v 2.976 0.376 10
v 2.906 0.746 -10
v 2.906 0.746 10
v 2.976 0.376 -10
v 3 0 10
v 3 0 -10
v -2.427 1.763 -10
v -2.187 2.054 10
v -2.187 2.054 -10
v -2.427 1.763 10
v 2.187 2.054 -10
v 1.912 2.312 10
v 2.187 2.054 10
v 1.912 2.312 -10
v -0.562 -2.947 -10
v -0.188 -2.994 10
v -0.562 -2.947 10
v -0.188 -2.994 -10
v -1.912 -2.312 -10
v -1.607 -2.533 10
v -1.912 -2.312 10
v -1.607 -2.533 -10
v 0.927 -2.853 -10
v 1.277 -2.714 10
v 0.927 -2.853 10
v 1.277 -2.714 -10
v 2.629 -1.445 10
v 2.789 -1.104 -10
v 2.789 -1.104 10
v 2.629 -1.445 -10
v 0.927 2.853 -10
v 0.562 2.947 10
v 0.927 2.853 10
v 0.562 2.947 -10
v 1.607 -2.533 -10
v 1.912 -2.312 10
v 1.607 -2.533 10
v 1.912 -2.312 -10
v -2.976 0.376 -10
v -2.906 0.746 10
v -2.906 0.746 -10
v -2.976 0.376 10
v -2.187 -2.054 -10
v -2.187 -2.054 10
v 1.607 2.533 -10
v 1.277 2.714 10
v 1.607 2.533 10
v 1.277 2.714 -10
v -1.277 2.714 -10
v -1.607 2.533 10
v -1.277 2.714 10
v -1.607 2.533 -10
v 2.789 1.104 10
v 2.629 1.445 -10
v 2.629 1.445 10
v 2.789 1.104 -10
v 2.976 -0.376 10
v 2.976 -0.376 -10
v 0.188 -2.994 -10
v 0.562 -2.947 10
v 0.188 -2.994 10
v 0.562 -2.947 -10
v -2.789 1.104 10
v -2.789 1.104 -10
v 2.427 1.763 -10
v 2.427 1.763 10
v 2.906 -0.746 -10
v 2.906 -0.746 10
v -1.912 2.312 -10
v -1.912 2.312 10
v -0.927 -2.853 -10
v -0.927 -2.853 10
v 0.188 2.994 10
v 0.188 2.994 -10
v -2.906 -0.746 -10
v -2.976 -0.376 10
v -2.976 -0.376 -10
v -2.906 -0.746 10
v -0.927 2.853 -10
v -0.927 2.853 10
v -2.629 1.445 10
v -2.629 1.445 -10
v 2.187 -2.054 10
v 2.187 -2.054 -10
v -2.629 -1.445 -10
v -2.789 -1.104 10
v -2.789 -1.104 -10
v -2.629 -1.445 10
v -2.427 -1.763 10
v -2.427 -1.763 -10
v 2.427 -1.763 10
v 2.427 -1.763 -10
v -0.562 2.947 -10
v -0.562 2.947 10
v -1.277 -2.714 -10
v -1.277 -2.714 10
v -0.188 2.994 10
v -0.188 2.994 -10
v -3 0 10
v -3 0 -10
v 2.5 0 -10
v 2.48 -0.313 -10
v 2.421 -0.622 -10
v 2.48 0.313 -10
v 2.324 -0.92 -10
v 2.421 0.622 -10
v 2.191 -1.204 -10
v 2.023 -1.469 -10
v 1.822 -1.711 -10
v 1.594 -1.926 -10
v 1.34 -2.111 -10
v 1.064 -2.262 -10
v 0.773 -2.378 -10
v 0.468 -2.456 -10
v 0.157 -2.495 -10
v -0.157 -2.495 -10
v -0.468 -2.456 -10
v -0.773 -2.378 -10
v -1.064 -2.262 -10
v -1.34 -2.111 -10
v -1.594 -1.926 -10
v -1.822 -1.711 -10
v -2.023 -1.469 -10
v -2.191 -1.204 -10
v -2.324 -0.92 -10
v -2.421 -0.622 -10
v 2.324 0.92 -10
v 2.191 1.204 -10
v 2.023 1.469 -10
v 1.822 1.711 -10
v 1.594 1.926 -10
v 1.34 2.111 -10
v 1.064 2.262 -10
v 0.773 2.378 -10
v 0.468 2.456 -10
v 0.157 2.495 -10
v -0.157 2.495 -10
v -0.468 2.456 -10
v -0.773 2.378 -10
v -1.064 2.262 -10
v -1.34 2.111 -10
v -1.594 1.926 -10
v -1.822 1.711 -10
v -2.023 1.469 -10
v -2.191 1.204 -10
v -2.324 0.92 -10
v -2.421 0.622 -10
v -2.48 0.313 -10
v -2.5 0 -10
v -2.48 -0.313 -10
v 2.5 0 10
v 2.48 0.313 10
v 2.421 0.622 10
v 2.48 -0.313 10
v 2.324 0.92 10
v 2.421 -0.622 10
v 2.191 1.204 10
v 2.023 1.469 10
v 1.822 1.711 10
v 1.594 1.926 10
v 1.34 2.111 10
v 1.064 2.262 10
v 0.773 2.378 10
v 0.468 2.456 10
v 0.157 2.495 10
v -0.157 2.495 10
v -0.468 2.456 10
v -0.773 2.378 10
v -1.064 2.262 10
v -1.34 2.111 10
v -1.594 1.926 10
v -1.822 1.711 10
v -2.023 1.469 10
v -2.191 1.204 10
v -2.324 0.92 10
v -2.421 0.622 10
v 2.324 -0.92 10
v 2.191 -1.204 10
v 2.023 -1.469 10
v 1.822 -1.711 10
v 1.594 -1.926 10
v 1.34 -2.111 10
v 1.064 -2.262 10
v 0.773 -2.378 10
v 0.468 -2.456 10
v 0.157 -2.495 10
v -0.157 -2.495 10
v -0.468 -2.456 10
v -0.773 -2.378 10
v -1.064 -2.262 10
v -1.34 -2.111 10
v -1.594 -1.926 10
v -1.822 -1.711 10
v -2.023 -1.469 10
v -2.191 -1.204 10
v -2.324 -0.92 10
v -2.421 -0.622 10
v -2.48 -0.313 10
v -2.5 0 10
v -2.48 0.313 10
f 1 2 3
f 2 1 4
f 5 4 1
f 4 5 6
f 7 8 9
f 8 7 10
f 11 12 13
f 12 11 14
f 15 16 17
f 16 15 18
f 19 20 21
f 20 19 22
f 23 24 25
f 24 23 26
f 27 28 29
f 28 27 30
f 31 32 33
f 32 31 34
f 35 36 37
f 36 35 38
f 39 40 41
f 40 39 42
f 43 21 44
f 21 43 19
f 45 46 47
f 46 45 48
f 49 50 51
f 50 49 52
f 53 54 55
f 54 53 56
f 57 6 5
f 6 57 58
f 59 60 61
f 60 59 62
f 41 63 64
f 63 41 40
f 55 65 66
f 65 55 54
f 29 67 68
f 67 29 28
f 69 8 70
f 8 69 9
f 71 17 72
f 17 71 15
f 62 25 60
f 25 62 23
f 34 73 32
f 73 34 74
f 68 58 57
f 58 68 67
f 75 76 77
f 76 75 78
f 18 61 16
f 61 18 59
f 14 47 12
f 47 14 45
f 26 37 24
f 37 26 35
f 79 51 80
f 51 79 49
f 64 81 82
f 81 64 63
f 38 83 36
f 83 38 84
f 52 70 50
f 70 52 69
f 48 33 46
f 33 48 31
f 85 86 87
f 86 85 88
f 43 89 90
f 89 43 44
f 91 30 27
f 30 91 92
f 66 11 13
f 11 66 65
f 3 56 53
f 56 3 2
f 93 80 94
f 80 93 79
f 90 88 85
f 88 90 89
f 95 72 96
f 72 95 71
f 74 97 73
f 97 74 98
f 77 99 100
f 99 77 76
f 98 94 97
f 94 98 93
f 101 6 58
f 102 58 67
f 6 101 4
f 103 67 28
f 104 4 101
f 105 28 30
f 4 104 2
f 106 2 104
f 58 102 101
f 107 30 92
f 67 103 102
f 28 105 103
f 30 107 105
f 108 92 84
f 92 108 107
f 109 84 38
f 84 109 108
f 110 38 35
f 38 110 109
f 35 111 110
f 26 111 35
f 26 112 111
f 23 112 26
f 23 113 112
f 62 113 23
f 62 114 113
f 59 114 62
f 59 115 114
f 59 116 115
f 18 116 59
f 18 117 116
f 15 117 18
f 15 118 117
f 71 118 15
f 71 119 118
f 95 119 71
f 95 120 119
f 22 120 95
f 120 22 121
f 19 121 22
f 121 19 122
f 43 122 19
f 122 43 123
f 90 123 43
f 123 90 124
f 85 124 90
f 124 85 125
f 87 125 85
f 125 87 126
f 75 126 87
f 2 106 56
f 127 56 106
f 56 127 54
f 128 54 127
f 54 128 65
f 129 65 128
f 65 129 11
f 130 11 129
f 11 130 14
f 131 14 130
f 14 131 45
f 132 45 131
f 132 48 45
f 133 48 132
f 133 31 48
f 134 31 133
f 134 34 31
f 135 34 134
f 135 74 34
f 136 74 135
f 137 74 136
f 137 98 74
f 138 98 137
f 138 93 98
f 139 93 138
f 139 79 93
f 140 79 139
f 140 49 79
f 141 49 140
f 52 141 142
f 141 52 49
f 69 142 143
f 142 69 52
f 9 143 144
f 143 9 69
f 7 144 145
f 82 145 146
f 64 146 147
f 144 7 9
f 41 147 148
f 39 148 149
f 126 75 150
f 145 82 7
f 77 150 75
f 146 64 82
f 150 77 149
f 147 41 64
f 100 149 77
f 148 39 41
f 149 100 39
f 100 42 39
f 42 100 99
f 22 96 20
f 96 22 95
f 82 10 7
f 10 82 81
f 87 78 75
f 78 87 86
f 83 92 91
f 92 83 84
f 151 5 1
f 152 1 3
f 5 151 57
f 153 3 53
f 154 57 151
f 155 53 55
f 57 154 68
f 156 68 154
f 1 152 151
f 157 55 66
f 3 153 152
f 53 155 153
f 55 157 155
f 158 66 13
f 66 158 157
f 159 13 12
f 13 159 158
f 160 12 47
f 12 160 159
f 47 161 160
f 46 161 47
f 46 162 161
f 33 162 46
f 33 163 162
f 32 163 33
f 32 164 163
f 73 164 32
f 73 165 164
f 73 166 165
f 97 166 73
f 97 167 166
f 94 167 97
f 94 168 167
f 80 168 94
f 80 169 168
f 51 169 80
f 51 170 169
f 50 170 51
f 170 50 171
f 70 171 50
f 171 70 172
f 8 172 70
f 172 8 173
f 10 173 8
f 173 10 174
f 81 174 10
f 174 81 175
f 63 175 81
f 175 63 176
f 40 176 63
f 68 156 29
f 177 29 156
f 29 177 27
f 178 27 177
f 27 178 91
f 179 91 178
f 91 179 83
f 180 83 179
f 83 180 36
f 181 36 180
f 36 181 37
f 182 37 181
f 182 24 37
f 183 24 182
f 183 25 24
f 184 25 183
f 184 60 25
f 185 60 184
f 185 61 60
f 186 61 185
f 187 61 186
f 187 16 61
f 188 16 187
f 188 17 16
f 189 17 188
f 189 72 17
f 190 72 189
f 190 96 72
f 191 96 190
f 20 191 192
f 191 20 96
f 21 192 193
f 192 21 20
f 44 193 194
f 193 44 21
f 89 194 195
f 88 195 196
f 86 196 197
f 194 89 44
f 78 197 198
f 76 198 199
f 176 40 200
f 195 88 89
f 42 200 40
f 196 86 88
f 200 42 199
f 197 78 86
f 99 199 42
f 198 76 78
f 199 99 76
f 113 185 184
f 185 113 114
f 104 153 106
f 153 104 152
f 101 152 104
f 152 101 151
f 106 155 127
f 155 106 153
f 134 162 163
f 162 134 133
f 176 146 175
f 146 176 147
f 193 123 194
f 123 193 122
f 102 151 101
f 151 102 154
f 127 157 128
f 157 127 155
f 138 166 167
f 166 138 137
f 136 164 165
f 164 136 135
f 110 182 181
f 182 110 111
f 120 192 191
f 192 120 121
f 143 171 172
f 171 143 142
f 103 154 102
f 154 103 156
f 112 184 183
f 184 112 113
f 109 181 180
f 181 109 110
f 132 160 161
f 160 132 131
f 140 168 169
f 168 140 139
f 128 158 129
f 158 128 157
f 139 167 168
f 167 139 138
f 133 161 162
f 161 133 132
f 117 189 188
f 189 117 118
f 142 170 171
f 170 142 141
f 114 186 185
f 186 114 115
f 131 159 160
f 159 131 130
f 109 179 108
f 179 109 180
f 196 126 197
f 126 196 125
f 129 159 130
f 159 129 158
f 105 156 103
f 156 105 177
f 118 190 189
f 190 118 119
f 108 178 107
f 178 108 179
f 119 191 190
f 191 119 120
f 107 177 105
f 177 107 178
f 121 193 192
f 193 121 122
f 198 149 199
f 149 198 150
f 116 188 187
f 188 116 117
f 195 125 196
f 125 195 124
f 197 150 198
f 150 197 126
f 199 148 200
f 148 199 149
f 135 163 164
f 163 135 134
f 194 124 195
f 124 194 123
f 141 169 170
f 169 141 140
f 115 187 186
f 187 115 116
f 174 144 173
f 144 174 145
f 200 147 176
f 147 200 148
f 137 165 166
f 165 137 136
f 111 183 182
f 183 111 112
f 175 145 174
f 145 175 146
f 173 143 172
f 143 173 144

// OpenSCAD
$fn = 50;


difference() {
	union() {
		translate(v = [0, 0, -10.0000000000]) {
			cylinder(h = 20, r = 3.0000000000);
		}
	}
	union() {
		translate(v = [0, 0, -100.0000000000]) {
			cylinder(h = 200, r = 2.5000000000);
		}
	}
}
